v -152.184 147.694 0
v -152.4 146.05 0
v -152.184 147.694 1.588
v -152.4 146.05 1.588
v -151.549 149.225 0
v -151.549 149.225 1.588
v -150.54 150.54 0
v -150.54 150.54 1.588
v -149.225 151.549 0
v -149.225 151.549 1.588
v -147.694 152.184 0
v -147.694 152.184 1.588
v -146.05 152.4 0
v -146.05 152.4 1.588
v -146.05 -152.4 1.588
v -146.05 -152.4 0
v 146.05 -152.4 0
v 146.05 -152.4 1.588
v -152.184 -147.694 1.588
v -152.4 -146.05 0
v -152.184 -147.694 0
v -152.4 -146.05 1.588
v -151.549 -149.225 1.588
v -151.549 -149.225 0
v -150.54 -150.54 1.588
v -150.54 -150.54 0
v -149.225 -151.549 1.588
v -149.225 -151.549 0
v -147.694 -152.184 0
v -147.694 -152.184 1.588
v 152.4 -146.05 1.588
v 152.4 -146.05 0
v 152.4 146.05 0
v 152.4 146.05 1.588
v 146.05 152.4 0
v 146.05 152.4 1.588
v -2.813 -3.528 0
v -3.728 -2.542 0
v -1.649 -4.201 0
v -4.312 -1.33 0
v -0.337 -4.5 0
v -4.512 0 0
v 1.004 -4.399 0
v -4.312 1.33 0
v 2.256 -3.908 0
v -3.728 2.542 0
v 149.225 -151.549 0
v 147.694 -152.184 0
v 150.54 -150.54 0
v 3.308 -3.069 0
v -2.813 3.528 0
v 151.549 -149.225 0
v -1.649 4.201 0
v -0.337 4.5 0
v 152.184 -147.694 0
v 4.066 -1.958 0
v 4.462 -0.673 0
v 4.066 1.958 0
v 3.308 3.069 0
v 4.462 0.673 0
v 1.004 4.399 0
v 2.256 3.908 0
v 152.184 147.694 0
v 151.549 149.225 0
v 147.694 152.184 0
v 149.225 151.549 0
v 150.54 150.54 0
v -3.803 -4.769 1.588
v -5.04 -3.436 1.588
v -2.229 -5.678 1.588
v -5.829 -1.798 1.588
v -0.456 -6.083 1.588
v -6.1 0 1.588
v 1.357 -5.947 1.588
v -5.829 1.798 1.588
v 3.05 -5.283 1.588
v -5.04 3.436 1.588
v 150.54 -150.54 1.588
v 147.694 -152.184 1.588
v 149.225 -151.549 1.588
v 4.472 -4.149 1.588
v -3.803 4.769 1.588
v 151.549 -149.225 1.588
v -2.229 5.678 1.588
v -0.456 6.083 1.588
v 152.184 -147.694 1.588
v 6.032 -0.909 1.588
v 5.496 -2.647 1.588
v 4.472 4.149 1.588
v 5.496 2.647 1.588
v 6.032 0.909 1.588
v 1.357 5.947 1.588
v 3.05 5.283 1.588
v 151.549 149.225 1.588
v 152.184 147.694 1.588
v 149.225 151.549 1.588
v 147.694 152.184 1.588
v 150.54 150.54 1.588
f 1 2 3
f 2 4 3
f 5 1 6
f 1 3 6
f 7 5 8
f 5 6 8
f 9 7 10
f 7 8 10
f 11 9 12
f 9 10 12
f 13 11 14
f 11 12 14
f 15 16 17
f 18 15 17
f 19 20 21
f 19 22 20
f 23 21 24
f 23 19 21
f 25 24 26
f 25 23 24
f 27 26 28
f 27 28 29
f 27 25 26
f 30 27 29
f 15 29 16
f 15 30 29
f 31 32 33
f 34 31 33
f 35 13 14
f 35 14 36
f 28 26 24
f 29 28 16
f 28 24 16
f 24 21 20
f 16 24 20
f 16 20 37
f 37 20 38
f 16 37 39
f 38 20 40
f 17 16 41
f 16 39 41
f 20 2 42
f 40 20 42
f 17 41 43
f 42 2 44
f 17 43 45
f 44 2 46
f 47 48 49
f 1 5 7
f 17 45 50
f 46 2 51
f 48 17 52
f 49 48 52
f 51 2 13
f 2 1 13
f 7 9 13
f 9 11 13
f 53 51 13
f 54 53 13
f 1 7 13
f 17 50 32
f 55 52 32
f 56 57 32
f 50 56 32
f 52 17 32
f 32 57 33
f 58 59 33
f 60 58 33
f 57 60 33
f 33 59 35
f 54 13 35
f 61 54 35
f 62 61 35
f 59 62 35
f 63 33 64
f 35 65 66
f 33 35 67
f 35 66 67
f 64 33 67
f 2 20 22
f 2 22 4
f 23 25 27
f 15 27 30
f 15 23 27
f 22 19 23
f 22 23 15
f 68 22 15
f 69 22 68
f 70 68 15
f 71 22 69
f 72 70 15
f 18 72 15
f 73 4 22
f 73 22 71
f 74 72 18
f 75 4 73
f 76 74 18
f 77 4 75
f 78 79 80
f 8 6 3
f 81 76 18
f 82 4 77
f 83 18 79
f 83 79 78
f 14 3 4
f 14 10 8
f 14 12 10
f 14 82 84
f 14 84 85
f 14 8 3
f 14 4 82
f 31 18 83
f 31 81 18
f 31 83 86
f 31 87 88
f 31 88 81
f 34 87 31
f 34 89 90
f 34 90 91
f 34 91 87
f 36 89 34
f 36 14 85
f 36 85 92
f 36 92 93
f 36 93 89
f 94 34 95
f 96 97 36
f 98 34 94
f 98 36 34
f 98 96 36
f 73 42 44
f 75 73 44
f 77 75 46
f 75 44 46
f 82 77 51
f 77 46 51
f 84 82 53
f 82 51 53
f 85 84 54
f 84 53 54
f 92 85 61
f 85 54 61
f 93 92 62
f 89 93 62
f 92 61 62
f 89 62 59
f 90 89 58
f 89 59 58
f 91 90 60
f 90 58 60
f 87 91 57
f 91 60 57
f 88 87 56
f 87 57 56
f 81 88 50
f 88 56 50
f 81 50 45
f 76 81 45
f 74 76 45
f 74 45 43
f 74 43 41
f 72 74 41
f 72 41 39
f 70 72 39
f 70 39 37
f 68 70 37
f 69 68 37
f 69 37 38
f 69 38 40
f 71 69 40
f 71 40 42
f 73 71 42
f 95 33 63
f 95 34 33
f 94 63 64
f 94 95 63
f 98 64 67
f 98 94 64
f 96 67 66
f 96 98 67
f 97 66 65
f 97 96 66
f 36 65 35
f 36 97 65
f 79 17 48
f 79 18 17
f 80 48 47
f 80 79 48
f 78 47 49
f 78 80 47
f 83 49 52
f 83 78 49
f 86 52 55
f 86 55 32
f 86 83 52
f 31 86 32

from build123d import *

# Parameters (mm, degrees)
F0_W           = 304.8
F0_H           = 304.8
F1_DEPTH       = 1.5875
F2_R           = 6.35
F4_D           = 6.2
F4_CSINK_D     = 12.2
F4_CSINK_ANGLE = 90


# Not quite as in the source:
# - a length typed as a fraction of an inch, garbled in the dataset ("3 / 203.2 mm" for 3/8 in), is restored


with BuildPart() as f1:
    # F0 (on Top) → F1 (new body)
    with BuildSketch(Plane.XY):
        Rectangle(F0_W, F0_H)
    extrude(amount=F1_DEPTH)

    # F2
    f2_edges = [f1.edges().sort_by_distance(p)[0] for p in [
        (-152.4, -152.4, 0.79375),
        (152.4, -152.4, 0.79375),
        (152.4, 152.4, 0.79375),
        (-152.4, 152.4, 0.79375),
    ]]
    fillet(f2_edges, radius=F2_R)

    # F4 (through all)
    with Locations(Plane.XY.offset(1.5875)):
        with Locations((0, 0)):
            CounterSinkHole(F4_D / 2, F4_CSINK_D / 2, counter_sink_angle=F4_CSINK_ANGLE)


solid = f1.part
